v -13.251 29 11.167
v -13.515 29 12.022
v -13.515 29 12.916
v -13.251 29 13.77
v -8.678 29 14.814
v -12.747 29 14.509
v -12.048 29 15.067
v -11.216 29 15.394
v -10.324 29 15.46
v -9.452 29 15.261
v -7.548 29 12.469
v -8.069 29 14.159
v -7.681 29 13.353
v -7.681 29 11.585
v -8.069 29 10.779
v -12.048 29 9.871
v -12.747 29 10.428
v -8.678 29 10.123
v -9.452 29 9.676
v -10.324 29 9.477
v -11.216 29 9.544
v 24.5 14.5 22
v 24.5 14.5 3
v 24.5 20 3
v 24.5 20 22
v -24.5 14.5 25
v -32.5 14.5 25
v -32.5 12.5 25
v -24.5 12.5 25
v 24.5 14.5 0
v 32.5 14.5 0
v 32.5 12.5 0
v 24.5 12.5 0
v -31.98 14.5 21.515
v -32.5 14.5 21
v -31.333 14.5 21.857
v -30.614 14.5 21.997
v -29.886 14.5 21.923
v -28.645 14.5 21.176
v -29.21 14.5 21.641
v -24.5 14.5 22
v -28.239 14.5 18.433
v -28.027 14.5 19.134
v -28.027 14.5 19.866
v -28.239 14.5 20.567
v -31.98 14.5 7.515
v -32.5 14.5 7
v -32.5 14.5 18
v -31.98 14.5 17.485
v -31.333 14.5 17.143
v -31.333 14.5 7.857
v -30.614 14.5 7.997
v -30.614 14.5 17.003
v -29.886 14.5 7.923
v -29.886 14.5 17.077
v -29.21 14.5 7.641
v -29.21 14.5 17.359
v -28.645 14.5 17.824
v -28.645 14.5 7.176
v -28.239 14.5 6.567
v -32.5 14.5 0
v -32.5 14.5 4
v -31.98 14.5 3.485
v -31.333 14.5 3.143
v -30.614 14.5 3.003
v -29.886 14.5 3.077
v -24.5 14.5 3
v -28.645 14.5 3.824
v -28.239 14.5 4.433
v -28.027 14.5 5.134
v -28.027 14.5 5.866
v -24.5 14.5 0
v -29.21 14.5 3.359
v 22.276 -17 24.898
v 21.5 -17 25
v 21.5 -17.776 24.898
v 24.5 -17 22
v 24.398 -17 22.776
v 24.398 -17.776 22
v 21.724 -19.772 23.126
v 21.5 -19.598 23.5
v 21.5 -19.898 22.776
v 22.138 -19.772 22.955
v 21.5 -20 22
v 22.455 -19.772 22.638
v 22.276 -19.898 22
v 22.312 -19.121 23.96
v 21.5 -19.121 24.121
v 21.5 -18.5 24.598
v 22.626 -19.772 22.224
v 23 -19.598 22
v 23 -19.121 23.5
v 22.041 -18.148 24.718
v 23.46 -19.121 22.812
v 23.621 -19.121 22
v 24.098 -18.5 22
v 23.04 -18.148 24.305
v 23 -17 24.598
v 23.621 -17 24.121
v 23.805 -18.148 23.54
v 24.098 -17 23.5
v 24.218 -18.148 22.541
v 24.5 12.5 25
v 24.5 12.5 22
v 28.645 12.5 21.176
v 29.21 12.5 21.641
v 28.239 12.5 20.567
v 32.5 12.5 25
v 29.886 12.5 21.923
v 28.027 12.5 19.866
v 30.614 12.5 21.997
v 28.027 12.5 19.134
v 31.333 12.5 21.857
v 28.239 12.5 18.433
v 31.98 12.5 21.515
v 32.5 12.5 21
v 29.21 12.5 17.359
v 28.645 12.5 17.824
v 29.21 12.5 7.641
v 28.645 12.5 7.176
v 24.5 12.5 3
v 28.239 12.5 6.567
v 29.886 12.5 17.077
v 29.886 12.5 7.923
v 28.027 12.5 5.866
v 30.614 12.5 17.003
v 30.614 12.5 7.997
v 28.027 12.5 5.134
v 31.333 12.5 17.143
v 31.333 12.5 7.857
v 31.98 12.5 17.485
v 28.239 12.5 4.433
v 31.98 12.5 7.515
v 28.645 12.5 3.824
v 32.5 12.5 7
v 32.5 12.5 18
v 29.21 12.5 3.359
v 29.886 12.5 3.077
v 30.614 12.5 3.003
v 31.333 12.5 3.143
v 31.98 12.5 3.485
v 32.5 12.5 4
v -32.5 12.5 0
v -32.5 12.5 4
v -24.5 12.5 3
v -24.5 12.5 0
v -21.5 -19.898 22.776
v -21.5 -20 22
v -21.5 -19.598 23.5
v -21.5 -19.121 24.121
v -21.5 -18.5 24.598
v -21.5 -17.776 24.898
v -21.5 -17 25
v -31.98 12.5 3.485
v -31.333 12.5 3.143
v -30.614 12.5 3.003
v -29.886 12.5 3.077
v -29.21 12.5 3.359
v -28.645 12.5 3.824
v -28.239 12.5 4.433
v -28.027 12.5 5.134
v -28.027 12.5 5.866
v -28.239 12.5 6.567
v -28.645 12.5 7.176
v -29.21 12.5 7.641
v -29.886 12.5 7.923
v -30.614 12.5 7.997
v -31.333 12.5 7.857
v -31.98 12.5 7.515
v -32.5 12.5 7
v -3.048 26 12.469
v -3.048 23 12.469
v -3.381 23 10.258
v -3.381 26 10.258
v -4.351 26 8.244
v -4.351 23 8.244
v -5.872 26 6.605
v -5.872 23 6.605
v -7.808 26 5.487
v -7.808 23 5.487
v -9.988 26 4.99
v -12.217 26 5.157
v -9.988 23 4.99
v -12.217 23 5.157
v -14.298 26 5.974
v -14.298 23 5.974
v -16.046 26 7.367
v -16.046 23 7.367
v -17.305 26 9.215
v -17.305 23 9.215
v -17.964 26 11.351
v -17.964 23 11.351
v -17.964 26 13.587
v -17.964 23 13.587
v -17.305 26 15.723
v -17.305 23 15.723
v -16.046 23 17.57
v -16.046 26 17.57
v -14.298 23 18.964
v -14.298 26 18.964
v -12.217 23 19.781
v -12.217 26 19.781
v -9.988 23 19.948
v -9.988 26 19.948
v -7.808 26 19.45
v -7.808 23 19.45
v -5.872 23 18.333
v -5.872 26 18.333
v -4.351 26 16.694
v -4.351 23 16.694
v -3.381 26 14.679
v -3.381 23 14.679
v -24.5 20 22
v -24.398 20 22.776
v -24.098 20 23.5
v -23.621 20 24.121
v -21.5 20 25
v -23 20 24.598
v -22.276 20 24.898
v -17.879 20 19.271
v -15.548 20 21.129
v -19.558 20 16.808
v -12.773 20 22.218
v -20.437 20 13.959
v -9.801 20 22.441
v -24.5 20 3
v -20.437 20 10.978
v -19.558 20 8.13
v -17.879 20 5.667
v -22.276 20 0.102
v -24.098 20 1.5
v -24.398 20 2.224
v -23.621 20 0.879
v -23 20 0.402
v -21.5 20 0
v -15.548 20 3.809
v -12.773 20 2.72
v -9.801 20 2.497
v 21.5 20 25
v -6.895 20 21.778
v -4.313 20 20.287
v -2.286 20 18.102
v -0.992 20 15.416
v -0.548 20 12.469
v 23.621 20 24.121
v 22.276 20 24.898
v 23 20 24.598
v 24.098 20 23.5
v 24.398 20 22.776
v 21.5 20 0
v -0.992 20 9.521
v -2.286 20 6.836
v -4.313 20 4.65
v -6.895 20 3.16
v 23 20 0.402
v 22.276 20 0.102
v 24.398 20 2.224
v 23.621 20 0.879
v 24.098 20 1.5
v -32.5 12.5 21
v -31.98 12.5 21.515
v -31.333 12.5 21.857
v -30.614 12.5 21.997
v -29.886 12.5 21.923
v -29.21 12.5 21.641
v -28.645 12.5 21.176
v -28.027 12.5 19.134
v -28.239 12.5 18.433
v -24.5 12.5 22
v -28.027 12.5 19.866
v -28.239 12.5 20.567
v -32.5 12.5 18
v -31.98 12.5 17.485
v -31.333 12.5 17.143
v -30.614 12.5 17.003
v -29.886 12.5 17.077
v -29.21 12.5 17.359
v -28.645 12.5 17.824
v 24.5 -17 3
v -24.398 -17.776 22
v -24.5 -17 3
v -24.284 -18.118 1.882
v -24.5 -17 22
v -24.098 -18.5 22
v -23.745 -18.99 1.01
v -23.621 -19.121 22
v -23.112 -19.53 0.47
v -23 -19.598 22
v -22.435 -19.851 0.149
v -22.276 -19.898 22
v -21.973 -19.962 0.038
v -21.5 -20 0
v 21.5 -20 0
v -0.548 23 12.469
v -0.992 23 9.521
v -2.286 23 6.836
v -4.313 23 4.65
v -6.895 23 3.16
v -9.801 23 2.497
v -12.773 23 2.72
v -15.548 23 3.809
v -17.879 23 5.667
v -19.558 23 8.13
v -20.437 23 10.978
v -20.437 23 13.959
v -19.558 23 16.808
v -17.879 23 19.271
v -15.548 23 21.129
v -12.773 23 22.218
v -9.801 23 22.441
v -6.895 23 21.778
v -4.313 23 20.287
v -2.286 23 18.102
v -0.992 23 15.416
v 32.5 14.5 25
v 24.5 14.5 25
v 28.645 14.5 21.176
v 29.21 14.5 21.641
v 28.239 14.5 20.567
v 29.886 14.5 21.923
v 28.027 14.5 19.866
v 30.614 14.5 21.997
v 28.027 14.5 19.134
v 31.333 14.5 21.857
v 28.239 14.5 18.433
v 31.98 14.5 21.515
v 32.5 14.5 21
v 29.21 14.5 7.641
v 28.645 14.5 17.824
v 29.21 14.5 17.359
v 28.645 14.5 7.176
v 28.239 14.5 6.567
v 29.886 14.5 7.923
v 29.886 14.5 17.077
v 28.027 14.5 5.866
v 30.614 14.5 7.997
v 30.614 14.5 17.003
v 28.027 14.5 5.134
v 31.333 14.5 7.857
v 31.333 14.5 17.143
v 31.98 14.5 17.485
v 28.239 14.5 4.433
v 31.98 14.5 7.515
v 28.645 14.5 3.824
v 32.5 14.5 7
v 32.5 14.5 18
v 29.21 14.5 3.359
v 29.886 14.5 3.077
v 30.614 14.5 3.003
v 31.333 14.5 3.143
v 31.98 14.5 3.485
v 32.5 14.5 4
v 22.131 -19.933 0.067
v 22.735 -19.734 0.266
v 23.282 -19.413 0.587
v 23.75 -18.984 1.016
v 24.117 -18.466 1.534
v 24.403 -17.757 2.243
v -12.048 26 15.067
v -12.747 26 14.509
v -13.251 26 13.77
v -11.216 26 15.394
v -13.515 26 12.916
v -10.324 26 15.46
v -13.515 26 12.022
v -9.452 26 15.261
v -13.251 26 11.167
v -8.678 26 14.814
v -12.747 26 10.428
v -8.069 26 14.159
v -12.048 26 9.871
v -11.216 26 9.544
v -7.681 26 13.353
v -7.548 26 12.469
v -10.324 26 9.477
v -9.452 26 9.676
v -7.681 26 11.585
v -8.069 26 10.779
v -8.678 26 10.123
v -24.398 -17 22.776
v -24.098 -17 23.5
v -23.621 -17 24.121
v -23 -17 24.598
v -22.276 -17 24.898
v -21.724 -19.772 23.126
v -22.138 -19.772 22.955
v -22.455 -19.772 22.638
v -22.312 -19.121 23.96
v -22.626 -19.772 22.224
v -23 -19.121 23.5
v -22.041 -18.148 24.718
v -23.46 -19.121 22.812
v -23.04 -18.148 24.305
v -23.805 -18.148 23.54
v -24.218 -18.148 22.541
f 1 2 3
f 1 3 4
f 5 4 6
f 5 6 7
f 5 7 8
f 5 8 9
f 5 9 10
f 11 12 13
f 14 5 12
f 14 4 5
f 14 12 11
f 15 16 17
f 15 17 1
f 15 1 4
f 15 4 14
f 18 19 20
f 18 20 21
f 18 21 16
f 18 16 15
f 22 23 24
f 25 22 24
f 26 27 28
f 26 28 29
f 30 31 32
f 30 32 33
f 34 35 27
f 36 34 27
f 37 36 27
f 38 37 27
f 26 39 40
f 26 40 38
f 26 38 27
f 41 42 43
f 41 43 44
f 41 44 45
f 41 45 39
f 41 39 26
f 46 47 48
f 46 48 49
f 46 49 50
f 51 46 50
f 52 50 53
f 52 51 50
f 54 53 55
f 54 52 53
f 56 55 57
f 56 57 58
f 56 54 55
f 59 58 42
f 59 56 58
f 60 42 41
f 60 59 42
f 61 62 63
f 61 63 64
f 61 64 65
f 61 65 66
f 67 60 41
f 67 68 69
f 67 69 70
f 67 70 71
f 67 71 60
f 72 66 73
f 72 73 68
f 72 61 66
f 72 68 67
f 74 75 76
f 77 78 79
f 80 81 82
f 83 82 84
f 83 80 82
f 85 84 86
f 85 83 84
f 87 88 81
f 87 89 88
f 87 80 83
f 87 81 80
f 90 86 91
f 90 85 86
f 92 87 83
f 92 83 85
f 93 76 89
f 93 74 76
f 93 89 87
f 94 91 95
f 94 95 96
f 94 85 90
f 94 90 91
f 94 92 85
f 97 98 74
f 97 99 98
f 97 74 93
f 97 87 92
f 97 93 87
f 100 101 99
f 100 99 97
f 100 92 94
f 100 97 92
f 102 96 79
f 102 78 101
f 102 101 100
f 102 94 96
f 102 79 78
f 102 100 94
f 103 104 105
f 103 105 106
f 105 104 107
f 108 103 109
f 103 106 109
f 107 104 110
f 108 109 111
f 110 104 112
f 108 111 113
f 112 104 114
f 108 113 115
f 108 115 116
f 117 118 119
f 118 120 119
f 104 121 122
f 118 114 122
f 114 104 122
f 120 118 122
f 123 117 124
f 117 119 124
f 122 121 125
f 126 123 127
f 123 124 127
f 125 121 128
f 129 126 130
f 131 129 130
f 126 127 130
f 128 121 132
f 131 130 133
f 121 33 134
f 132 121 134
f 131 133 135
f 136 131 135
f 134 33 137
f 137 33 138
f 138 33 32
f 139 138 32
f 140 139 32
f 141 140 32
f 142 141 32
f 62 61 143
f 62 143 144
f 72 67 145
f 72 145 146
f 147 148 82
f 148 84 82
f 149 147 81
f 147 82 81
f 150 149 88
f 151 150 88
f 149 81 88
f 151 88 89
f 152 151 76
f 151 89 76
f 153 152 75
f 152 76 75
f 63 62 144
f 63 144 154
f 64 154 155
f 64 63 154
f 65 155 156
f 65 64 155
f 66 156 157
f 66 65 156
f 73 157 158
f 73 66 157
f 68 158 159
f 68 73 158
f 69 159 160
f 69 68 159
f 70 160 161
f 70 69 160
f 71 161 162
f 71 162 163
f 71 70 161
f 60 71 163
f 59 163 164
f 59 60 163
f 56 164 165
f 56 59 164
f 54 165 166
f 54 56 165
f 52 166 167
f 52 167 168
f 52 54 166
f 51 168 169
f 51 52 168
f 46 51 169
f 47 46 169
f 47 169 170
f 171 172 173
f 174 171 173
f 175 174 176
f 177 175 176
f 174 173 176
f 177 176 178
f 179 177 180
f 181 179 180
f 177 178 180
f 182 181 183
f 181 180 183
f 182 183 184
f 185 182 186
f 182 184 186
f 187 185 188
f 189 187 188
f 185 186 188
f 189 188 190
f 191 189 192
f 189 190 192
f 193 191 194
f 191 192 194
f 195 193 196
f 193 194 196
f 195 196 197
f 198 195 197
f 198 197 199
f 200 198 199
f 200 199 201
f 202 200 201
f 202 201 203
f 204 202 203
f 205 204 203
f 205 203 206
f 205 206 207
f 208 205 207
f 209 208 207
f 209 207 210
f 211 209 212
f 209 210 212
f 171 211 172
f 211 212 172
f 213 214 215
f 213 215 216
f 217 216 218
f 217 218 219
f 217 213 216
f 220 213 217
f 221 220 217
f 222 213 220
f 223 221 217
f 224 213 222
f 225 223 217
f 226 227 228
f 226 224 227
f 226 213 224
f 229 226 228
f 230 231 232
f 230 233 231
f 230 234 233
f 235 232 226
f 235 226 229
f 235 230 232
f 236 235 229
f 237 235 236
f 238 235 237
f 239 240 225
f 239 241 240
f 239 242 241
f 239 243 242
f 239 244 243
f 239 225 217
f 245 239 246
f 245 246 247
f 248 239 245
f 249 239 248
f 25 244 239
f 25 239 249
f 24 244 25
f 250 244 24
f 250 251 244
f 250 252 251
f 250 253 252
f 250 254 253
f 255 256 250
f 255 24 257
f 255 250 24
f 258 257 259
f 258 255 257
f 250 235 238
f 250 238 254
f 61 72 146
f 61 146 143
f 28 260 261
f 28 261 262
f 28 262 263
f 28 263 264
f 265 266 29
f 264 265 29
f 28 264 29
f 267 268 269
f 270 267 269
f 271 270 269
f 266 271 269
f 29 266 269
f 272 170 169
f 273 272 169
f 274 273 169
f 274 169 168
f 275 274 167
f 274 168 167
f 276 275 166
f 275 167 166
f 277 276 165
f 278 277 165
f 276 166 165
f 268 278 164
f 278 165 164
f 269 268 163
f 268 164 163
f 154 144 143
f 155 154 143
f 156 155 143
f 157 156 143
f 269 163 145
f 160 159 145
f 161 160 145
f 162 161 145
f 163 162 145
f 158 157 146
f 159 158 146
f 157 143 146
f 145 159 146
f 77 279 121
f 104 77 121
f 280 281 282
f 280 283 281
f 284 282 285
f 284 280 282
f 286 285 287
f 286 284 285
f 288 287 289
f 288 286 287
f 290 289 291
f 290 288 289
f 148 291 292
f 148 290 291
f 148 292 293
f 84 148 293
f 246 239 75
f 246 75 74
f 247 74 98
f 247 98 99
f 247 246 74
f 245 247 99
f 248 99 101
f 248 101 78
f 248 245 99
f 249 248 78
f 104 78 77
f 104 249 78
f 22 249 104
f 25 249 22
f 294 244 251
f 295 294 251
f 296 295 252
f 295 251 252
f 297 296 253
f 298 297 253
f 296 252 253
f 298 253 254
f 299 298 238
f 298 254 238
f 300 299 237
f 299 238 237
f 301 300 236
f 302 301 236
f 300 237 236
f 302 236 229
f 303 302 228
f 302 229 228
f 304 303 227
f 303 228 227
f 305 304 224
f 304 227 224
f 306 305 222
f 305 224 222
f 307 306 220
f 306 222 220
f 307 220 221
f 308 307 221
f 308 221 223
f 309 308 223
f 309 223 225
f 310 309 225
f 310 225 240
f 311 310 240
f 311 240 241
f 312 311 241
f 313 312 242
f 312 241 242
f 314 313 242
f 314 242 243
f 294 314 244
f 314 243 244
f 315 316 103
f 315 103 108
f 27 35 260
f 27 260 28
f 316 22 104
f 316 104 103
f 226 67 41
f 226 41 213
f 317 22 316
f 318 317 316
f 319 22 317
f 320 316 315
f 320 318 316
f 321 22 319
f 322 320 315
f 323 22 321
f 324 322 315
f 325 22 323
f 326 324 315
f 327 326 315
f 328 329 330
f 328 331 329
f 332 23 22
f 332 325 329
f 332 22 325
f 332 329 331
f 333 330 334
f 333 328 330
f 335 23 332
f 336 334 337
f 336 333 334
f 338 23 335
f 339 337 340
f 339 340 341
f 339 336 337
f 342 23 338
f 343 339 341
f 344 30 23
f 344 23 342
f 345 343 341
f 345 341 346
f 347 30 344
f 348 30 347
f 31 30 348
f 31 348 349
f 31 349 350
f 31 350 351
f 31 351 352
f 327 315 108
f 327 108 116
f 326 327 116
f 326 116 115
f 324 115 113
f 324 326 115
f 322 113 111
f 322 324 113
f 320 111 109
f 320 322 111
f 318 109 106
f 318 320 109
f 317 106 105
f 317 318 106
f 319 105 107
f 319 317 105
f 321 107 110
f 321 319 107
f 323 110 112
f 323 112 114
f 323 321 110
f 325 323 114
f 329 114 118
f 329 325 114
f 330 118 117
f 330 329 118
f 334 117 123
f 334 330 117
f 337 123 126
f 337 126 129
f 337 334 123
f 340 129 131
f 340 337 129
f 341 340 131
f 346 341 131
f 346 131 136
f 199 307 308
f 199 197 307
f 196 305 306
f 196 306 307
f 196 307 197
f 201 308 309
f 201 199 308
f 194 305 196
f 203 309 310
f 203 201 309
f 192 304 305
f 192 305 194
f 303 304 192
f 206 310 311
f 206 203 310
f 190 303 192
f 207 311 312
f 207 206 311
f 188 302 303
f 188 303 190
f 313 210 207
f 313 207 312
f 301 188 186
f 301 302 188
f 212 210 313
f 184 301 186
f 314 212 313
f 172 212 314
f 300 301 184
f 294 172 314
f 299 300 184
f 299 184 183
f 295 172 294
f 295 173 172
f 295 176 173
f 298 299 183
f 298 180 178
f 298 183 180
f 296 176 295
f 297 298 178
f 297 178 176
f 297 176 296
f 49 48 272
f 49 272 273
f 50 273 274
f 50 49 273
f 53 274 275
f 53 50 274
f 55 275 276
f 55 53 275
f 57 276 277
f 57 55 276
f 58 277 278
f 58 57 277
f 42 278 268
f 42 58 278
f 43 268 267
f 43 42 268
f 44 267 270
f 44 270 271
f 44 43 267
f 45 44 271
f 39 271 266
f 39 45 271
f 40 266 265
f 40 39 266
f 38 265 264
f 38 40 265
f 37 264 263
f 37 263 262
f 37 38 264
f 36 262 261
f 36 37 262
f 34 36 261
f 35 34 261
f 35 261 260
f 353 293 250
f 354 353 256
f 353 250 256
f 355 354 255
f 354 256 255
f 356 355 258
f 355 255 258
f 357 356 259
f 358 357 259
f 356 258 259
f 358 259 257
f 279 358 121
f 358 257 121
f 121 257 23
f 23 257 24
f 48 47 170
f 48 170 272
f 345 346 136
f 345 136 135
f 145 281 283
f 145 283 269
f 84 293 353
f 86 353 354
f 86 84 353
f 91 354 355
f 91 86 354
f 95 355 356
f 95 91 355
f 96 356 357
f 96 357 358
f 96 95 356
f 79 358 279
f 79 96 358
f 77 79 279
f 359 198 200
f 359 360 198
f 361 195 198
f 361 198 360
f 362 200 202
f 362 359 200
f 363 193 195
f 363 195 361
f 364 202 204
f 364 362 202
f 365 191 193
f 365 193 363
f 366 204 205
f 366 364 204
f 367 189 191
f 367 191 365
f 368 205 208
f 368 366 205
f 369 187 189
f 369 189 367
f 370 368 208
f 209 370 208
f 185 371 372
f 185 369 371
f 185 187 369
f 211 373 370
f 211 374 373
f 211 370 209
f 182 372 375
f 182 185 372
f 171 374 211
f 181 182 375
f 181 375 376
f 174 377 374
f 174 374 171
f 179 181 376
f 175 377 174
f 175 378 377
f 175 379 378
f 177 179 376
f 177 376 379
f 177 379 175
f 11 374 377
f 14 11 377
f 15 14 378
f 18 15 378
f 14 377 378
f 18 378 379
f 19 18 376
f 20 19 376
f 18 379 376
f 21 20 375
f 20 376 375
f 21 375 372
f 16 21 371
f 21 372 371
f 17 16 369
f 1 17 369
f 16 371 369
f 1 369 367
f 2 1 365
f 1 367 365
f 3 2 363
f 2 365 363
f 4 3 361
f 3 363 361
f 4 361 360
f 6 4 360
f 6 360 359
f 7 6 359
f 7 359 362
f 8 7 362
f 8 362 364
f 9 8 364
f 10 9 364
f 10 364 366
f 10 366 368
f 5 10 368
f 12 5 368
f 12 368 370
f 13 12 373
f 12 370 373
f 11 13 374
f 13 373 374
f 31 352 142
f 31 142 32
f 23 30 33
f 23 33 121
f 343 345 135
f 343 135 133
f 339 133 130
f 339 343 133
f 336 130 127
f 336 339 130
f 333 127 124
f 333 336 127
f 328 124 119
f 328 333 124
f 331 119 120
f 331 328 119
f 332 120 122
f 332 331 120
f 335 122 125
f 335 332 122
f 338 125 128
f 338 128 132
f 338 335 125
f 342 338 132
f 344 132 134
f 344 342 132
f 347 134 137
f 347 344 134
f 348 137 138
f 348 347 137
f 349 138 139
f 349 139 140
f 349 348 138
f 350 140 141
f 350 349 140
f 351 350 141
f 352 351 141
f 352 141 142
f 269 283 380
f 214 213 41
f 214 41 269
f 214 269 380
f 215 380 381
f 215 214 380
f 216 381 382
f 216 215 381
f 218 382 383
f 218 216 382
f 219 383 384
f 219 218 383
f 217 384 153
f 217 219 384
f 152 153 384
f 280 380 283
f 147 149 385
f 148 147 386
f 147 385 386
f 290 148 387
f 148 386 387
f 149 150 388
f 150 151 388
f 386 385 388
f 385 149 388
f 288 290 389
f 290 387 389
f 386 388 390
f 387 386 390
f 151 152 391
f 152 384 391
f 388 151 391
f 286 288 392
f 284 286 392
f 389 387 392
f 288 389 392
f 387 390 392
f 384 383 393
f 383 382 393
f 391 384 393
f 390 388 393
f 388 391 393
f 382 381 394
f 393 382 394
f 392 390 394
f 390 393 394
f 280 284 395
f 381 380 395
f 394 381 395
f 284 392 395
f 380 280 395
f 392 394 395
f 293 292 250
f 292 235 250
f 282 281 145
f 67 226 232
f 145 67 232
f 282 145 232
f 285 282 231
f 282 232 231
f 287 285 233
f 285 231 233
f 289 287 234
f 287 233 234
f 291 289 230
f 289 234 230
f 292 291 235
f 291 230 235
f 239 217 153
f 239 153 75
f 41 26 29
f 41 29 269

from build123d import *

# Parameters (mm, degrees)
SKETCH1_W           = 49
SKETCH1_H           = 40
BOSS_EXTRUDE1_DEPTH = 25
SKETCH4_R           = 10
BOSS_EXTRUDE2_DEPTH = 3
SKETCH5_R           = 7.5
BOSS_EXTRUDE3_DEPTH = 3
SKETCH6_R           = 3
BOSS_EXTRUDE4_DEPTH = 3
FILLET1_R           = 3
BOSS_EXTRUDE5_DEPTH = 2


with BuildPart() as part:
    # Sketch1 → Boss-Extrude1 (new body)
    with BuildSketch(Plane.XY):
        Rectangle(SKETCH1_W, SKETCH1_H)
    extrude(amount=BOSS_EXTRUDE1_DEPTH)

    # Sketch4 → Boss-Extrude2 (add)
    with BuildSketch(Plane(origin=(0, 20, 0), x_dir=(1, 0, 0), z_dir=(0, 1, 0))):
        with Locations((-10.548196044, -12.468792319)):
            Circle(SKETCH4_R)
    extrude(amount=BOSS_EXTRUDE2_DEPTH)

    # Sketch5 → Boss-Extrude3 (add)
    with BuildSketch(Plane(origin=(0, 23, 0), x_dir=(1, 0, 0), z_dir=(0, 1, 0))):
        with Locations((-10.548196044, -12.468792319)):
            Circle(SKETCH5_R)
    extrude(amount=BOSS_EXTRUDE3_DEPTH)

    # Sketch6 → Boss-Extrude4 (add)
    with BuildSketch(Plane(origin=(0, 26, 0), x_dir=(1, 0, 0), z_dir=(0, 1, 0))):
        with Locations((-10.548196044, -12.468792319)):
            Circle(SKETCH6_R)
    extrude(amount=BOSS_EXTRUDE4_DEPTH)

    # Fillet1
    fillet1_edges = [part.edges().sort_by_distance(p)[0] for p in [
        (24.5, 0, 25),
        (-24.5, 0, 25),
        (24.5, 0, 0),
        (-24.5, 0, 0),
        (0, -20, 25),
        (24.5, -20, 12.5),
        (-24.5, -20, 12.5),
    ]]
    fillet(fillet1_edges, radius=FILLET1_R)

    # Sketch7 → Boss-Extrude5 (add)
    with BuildSketch(Plane(origin=(0, 14.5, 0), x_dir=(1, 0, 0), z_dir=(0, 1, 0))):
        with BuildLine():
            Line((-24.5, 0), (-32.5, 0))
            Line((-32.5, 0), (-32.5, -4))
            ThreePointArc((-32.5, -4), (-28, -5.5), (-32.5, -7))
            Line((-32.5, -7), (-32.5, -18))
            ThreePointArc((-32.5, -18), (-28, -19.5), (-32.5, -21))
            Line((-32.5, -21), (-32.5, -25))
            Line((-32.5, -25), (-24.5, -25))
            Line((-24.5, -25), (-24.5, 0))
        make_face()
        with BuildLine():
            Line((24.5, 0), (24.5, -25))
            Line((24.5, -25), (32.5, -25))
            Line((32.5, -25), (32.5, -21))
            ThreePointArc((32.5, -21), (28, -19.5), (32.5, -18))
            Line((32.5, -18), (32.5, -7))
            ThreePointArc((32.5, -7), (28, -5.5), (32.5, -4))
            Line((32.5, -4), (32.5, 0))
            Line((32.5, 0), (24.5, 0))
        make_face()
    extrude(amount=-BOSS_EXTRUDE5_DEPTH)


solid = part.part
